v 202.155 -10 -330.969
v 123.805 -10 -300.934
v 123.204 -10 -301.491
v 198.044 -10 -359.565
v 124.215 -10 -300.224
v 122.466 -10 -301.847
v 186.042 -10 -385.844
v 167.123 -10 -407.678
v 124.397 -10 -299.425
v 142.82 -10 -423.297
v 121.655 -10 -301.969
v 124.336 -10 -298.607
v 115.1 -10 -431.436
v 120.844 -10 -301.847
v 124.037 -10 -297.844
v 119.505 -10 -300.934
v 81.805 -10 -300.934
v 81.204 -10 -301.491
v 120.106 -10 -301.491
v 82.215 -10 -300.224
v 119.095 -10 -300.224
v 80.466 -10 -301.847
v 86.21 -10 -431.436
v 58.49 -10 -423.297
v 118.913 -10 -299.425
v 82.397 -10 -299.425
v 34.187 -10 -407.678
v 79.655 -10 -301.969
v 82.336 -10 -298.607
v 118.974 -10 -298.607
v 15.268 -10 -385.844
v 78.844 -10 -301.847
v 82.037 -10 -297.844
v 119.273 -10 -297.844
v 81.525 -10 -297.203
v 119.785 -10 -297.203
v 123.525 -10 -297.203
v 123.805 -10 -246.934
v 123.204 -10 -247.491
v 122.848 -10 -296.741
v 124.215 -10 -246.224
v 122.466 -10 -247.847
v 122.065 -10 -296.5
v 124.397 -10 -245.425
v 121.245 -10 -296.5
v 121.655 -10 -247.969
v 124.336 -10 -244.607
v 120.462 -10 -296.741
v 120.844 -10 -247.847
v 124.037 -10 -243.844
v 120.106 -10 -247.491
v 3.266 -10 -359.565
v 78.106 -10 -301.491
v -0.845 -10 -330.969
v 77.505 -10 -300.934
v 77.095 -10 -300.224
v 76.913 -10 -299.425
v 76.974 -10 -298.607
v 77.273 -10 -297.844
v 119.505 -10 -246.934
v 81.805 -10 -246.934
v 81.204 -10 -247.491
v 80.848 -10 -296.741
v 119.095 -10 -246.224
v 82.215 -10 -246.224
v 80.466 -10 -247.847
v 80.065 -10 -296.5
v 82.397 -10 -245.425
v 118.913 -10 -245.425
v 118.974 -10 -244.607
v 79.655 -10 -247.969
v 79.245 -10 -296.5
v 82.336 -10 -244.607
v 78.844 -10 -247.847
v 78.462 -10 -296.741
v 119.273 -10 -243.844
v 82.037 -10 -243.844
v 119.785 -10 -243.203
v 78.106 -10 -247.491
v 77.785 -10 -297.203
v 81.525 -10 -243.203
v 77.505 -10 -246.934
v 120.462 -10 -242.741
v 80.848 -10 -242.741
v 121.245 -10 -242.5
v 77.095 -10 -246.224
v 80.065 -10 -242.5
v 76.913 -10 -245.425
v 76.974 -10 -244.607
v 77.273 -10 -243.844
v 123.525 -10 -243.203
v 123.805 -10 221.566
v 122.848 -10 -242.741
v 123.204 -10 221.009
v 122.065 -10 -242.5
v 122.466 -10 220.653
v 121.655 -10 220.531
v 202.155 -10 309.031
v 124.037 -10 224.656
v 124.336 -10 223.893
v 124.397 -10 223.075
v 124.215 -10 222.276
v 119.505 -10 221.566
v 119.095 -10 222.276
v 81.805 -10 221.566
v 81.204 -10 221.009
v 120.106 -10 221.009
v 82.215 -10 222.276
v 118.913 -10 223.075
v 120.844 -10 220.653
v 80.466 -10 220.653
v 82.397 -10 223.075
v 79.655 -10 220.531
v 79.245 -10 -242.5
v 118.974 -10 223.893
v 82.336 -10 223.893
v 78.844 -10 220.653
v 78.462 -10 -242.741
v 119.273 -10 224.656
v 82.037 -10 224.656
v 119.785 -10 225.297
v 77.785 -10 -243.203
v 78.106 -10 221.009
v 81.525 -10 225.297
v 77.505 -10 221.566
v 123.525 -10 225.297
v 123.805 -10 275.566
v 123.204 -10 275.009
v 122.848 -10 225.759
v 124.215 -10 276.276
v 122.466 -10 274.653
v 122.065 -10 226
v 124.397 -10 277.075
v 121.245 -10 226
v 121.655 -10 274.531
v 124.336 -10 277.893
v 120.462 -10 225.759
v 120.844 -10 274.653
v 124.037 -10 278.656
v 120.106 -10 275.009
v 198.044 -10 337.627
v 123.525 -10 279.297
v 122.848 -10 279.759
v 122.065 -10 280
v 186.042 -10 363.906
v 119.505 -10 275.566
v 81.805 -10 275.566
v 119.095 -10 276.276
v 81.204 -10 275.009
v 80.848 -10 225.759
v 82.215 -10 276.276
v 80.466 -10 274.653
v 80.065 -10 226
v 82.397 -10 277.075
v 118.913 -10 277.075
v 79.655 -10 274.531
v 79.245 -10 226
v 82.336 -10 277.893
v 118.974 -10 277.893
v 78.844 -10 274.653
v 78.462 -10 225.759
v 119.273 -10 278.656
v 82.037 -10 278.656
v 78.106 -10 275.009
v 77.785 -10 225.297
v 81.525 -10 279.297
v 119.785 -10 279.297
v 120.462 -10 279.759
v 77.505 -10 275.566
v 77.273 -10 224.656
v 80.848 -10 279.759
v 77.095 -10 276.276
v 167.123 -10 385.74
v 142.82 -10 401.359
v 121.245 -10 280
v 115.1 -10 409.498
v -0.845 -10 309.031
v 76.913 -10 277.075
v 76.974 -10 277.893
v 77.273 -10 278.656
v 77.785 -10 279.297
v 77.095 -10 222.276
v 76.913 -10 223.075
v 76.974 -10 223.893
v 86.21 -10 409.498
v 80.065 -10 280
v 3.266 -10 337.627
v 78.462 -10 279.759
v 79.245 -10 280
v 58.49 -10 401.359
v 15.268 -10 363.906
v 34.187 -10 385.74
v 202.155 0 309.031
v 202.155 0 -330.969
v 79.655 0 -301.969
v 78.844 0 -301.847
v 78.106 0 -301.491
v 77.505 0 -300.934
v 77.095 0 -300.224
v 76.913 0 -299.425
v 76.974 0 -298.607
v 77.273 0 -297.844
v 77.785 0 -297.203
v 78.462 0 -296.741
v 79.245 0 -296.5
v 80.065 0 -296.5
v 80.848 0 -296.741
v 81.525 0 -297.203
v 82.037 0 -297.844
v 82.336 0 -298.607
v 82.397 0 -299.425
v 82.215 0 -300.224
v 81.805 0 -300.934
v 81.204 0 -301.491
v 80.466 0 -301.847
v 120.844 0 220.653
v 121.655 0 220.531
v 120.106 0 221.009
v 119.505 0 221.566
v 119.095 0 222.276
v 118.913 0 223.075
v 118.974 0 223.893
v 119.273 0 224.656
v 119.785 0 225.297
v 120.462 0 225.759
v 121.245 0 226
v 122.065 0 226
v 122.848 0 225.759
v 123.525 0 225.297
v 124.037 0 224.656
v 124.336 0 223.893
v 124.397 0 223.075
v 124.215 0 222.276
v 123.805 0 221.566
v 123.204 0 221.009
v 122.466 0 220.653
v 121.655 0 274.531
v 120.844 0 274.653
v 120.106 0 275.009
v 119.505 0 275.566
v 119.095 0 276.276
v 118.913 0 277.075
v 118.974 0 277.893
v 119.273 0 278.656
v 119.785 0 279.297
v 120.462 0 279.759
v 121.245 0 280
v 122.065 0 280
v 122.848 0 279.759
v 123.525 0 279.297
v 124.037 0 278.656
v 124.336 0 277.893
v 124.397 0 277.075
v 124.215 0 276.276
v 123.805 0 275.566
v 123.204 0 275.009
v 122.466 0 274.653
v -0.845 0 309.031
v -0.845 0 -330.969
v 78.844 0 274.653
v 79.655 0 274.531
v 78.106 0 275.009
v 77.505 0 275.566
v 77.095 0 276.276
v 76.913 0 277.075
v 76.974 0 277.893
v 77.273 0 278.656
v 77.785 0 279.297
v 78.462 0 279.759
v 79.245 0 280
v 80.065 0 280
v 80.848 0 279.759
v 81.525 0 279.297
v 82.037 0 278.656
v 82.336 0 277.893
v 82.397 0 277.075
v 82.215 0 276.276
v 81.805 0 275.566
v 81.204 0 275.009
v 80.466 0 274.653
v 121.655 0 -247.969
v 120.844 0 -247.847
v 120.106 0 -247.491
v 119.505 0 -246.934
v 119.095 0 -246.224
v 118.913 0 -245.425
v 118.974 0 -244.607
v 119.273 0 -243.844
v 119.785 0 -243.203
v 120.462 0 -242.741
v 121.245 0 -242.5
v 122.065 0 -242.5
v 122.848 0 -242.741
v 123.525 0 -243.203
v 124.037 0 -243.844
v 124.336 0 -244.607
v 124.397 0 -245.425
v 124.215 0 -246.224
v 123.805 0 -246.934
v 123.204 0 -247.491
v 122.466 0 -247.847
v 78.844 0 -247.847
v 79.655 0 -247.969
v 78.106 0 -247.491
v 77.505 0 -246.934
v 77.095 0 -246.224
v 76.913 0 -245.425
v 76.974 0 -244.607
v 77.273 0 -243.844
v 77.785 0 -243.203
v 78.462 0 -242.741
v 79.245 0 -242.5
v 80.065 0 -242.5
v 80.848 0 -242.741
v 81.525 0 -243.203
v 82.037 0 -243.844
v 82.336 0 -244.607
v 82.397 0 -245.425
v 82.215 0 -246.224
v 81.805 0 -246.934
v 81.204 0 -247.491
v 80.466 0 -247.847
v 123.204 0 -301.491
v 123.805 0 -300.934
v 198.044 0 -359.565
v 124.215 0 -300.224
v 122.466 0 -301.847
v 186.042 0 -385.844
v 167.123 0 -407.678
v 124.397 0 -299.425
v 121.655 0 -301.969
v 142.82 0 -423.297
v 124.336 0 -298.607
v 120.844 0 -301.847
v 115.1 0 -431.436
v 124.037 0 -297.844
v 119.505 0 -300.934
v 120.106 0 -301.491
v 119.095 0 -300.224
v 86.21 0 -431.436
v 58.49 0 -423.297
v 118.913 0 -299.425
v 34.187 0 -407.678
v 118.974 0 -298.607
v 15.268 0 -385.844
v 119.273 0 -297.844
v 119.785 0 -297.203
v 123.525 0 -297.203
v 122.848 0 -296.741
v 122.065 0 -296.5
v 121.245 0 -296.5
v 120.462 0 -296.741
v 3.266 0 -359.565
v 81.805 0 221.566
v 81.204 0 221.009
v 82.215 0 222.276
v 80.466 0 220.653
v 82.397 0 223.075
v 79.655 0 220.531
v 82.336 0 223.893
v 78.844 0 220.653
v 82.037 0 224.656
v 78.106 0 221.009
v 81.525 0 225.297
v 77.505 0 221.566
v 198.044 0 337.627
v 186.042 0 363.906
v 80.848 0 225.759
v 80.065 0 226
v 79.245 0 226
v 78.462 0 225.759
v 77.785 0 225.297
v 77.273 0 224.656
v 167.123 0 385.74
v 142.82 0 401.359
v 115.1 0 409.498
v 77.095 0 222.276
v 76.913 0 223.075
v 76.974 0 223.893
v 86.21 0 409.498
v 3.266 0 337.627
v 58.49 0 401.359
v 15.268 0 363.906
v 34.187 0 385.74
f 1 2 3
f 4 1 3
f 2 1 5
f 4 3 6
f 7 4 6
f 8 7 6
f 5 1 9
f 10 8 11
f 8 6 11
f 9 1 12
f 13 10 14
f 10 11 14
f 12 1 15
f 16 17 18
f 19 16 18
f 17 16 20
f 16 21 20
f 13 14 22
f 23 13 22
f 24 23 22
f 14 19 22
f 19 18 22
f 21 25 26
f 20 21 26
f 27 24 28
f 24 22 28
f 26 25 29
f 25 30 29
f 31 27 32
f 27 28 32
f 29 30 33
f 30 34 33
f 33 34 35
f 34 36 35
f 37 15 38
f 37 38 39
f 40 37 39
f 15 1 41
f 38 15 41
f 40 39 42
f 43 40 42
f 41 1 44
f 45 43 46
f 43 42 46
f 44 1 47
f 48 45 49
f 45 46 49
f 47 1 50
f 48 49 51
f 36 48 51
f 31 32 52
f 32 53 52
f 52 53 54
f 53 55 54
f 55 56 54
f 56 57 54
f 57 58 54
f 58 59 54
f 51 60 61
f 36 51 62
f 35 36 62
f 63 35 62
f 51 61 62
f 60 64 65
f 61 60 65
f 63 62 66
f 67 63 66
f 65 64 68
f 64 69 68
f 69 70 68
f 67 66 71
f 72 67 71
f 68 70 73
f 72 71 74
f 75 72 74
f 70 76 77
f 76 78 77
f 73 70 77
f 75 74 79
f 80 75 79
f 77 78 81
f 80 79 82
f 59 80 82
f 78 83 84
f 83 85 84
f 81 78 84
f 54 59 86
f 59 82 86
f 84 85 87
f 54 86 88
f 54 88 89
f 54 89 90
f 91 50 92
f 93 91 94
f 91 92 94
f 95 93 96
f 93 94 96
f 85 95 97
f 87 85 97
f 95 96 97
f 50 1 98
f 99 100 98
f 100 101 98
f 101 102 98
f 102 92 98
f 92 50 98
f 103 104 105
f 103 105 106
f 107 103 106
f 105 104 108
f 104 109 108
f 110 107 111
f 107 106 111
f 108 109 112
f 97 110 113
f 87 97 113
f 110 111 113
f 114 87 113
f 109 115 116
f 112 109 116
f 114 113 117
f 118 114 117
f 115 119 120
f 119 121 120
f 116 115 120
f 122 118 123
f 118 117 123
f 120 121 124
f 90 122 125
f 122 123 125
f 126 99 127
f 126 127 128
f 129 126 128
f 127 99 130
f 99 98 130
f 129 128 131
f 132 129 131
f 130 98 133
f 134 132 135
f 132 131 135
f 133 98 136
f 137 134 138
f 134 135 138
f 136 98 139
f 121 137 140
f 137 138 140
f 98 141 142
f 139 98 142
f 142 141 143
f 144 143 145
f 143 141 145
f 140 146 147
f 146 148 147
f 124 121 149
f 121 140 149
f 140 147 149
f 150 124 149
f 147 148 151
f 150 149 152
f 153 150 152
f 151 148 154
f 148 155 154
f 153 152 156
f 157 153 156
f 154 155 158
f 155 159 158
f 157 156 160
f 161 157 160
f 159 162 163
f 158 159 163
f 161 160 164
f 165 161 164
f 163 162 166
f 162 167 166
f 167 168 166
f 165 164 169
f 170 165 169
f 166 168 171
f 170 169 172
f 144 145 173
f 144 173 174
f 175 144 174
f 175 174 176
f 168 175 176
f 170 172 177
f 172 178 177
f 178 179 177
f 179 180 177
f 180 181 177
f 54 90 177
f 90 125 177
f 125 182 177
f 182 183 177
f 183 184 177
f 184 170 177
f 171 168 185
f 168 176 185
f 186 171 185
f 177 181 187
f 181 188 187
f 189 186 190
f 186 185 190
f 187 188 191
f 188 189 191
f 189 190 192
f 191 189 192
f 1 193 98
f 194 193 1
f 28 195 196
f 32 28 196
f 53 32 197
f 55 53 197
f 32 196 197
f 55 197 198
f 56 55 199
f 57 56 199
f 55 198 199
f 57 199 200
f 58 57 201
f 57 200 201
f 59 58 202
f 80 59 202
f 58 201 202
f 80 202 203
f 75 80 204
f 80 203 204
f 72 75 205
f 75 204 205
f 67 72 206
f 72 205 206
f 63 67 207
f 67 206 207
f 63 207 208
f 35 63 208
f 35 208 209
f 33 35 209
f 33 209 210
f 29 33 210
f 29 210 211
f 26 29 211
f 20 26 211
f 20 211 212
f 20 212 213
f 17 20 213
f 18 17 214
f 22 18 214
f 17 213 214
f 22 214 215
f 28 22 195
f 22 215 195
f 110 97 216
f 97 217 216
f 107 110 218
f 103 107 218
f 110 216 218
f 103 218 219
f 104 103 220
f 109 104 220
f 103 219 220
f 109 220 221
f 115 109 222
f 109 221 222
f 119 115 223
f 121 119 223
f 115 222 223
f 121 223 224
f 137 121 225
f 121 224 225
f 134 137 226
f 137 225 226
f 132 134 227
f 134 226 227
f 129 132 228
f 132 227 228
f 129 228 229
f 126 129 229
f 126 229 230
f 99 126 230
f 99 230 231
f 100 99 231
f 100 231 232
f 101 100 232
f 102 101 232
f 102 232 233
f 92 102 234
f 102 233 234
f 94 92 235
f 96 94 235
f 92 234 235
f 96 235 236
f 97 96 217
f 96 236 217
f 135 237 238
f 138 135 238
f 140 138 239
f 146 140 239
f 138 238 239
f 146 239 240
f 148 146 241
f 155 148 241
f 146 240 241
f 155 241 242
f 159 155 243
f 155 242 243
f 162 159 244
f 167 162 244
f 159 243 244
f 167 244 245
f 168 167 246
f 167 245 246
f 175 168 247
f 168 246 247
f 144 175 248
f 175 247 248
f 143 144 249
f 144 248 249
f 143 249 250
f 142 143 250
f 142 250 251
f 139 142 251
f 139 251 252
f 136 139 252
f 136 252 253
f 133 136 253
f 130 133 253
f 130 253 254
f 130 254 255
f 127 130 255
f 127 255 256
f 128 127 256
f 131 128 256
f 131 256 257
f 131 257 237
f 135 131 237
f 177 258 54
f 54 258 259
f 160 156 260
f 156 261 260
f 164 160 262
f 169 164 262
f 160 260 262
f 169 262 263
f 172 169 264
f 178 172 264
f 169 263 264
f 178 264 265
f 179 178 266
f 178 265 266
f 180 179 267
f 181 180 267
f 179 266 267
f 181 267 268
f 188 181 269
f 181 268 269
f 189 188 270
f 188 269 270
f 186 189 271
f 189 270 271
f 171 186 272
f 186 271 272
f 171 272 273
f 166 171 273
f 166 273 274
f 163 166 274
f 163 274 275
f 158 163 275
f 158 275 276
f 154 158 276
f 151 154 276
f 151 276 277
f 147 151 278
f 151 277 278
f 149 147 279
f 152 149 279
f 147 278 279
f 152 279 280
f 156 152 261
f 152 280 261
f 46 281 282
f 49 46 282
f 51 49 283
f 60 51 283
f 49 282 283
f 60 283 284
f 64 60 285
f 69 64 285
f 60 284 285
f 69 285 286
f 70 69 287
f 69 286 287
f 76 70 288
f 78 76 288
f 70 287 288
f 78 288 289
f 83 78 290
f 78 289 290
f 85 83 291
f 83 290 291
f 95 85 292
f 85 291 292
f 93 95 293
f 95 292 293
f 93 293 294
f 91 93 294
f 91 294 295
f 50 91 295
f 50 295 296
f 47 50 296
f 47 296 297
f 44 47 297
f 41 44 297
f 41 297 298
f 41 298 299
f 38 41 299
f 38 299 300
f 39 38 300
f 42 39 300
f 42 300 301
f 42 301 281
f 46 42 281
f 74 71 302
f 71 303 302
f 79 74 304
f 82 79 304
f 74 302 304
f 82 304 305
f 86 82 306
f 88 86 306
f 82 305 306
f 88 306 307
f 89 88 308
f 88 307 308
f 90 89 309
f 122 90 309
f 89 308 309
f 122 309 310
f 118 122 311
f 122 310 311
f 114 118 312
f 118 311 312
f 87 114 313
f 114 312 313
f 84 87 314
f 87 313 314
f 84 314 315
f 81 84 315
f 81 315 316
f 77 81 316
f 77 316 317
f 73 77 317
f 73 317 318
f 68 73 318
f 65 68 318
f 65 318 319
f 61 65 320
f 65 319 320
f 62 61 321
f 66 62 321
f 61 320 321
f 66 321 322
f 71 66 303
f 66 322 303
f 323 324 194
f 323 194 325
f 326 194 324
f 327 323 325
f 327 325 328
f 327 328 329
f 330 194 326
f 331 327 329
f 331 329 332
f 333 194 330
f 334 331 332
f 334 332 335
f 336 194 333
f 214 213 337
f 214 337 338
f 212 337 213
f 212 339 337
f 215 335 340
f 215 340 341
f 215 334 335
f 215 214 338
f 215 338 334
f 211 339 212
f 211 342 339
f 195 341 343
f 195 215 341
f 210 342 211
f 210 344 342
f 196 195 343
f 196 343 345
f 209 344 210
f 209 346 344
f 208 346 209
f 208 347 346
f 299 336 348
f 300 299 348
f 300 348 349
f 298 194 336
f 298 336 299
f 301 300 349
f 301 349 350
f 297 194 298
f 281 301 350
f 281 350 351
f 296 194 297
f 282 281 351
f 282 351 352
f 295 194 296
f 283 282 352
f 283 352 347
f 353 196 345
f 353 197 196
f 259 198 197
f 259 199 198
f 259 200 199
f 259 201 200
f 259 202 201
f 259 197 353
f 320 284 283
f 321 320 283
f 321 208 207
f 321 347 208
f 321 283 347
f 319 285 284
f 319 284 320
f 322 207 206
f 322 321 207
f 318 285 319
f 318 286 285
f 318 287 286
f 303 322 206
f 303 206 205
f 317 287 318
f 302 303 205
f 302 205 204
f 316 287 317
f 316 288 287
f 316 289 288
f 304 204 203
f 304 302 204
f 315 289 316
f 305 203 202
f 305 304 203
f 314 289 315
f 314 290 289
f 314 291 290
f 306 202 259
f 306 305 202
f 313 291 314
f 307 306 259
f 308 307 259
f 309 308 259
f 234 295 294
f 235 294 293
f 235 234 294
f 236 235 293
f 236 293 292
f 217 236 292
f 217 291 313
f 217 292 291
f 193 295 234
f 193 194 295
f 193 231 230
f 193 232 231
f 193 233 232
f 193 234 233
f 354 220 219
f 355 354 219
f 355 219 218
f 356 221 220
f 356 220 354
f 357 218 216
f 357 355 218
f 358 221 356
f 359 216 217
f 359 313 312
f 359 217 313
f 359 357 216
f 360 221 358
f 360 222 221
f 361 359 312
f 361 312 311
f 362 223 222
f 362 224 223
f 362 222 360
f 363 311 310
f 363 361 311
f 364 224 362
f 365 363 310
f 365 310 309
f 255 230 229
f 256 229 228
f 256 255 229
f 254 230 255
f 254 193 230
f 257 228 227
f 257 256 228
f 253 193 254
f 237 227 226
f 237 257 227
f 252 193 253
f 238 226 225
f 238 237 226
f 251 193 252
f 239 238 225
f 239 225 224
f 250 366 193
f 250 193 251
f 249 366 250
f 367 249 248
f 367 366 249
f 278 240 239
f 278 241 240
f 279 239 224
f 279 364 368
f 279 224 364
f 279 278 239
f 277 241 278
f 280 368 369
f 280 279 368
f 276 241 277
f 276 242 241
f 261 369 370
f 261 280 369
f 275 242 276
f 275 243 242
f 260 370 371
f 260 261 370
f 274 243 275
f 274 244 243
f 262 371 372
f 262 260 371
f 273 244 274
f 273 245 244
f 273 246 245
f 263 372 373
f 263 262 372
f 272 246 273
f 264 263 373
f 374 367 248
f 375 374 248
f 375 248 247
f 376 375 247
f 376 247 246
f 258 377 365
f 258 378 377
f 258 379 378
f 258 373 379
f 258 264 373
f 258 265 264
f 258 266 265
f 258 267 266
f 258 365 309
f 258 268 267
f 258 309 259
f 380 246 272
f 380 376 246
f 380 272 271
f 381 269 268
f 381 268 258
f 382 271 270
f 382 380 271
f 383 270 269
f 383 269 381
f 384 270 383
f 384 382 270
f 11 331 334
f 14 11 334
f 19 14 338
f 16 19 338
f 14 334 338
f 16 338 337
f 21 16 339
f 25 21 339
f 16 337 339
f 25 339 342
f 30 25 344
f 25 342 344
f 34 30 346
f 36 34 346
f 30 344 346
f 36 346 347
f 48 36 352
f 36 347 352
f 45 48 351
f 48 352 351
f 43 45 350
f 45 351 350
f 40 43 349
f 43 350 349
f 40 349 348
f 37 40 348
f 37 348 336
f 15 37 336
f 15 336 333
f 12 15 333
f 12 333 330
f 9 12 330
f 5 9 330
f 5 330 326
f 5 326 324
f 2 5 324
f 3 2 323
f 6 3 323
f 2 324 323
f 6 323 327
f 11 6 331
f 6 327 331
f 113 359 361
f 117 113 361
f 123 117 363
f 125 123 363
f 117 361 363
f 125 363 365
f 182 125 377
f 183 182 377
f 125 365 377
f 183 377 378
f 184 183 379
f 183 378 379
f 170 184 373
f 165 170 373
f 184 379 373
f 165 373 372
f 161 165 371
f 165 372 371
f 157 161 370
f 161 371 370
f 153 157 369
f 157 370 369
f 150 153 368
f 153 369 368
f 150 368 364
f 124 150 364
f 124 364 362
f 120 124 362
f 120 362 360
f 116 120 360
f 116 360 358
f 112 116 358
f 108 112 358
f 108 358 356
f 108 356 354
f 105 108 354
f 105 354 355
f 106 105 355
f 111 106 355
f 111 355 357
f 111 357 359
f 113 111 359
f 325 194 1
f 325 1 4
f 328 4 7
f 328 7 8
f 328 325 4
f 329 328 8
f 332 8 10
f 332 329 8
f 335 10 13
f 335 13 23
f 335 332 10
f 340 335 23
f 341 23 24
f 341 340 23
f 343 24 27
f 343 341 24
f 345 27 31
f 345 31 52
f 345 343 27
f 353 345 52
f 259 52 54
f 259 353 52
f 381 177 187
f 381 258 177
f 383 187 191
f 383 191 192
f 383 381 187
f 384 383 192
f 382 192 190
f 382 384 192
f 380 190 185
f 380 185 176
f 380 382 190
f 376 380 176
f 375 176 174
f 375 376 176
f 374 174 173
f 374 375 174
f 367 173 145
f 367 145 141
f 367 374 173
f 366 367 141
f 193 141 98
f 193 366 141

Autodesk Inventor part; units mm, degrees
ref_plane "YZ Plane" through (0, 0, 0) normal (1, 0, 0) x (0, 1, 0)
ref_plane "XZ Plane" through (0, 0, 0) normal (0, 1, 0) x (-1, 0, 0)
ref_plane "XY Plane" through (0, 0, 0) normal (0, 0, 1) x (1, 0, 0)
sketch "スケッチ1" plane through (0, 0, 0) normal (0, 1, 0) x (-1, 0, 0)
  point P0 (0, 0)
sketch "スケッチ2" plane through (0, 0, 0) normal (0, 1, 0) x (-1, 0, 0)
  line L0 (0.845, -60.969) -> (0.845, -330.969)
  line L1 (0, 0) -> (0, -1.5537)
  line L2 (-202.155, -60.969) -> (-202.155, -330.969)
  arc A0 (-202.155, -330.969) -> (0.845, -330.969) centre (-100.655, -330.969) ccw
  line L3 (0.845, -60.969) -> (0.845, 309.031)
  line L4 (-202.155, -60.969) -> (-202.155, 309.031)
  arc A1 (0.845, 309.031) -> (-202.155, 309.031) centre (-100.655, 309.031) ccw
  dimension "d0" = 270
  dimension "d1" = 203
extrude "押し出し1" add sketch "スケッチ2" against normal blind 10
sketch "スケッチ4" plane through (0, -10, 0) normal (0, -1, 0) x (1, 0, 0)
  line L0 (73.655, -234.969) -> (127.655, -234.969)
  line L1 (127.655, -234.969) -> (127.655, -310.969)
  line L2 (127.655, -310.969) -> (73.655, -310.969)
  line L3 (73.655, -310.969) -> (73.655, -234.969)
  line L4 (202.155, -330.969) -> (202.155, 309.031) projected
  line L5 (-0.845, 309.031) -> (-0.845, -330.969) projected
  arc A0 (-0.845, -330.969) -> (202.155, -330.969) centre (100.655, -330.969) ccw projected
  line L6 (-0.845, -10.969) -> (202.155, -10.969)
  arc A1 (202.155, 309.031) -> (-0.845, 309.031) centre (100.655, 309.031) ccw projected
  line L7 (73.655, 213.031) -> (127.655, 213.031)
  line L8 (127.655, 213.031) -> (127.655, 289.031)
  line L9 (127.655, 289.031) -> (73.655, 289.031)
  line L10 (73.655, 289.031) -> (73.655, 213.031)
  circle A2 centre (79.655, -299.219) radius 2.75
  line L11 (100.655, -256.1001) -> (100.655, -272.969)
  circle A3 centre (79.655, -245.219) radius 2.75
  circle A4 centre (121.655, -299.219) radius 2.75
  circle A5 centre (121.655, -245.219) radius 2.75
  line L12 (73.655, 213.031) -> (127.655, 213.031)
  line L13 (127.655, 213.031) -> (127.655, 289.031)
  line L14 (127.655, 289.031) -> (73.655, 289.031)
  line L15 (73.655, 289.031) -> (73.655, 213.031)
  circle A6 centre (79.655, 277.281) radius 2.75
  line L16 (100.655, 234.1622) -> (100.655, 251.031)
  circle A7 centre (79.655, 223.281) radius 2.75
  circle A8 centre (121.655, 223.281) radius 2.75
  circle A9 centre (121.655, 277.281) radius 2.75
  point P0 (0, 0)
  dimension "d4" = 74.5
  dimension "d5" = 74.5
  dimension "d6" = 54
  dimension "d7" = 76
  dimension "d8" = 20
  dimension "d9" = 320
  dimension "d17" = 5.5
  dimension "d18" = 11.75
  dimension "d19" = 6
  dimension "d20" = 27
  dimension "d21" = 5.5
  dimension "d22" = 10.25
  dimension "d23" = 6
hole "穴2" at (79.655, -10, -245.219) at (79.655, -10, -299.219) at (121.655, -10, -299.219) at (121.655, -10, -245.219) direction (0, 1, 0) diameter 5.5 end through all
hole "穴3" at (79.655, -10, 223.281) at (121.655, -10, 223.281) at (121.655, -10, 277.281) at (79.655, -10, 277.281) direction (0, 1, 0) diameter 5.5 end through all
properties part number "sfp_smartboard_deck_upper" material "合板、仕上げ"
